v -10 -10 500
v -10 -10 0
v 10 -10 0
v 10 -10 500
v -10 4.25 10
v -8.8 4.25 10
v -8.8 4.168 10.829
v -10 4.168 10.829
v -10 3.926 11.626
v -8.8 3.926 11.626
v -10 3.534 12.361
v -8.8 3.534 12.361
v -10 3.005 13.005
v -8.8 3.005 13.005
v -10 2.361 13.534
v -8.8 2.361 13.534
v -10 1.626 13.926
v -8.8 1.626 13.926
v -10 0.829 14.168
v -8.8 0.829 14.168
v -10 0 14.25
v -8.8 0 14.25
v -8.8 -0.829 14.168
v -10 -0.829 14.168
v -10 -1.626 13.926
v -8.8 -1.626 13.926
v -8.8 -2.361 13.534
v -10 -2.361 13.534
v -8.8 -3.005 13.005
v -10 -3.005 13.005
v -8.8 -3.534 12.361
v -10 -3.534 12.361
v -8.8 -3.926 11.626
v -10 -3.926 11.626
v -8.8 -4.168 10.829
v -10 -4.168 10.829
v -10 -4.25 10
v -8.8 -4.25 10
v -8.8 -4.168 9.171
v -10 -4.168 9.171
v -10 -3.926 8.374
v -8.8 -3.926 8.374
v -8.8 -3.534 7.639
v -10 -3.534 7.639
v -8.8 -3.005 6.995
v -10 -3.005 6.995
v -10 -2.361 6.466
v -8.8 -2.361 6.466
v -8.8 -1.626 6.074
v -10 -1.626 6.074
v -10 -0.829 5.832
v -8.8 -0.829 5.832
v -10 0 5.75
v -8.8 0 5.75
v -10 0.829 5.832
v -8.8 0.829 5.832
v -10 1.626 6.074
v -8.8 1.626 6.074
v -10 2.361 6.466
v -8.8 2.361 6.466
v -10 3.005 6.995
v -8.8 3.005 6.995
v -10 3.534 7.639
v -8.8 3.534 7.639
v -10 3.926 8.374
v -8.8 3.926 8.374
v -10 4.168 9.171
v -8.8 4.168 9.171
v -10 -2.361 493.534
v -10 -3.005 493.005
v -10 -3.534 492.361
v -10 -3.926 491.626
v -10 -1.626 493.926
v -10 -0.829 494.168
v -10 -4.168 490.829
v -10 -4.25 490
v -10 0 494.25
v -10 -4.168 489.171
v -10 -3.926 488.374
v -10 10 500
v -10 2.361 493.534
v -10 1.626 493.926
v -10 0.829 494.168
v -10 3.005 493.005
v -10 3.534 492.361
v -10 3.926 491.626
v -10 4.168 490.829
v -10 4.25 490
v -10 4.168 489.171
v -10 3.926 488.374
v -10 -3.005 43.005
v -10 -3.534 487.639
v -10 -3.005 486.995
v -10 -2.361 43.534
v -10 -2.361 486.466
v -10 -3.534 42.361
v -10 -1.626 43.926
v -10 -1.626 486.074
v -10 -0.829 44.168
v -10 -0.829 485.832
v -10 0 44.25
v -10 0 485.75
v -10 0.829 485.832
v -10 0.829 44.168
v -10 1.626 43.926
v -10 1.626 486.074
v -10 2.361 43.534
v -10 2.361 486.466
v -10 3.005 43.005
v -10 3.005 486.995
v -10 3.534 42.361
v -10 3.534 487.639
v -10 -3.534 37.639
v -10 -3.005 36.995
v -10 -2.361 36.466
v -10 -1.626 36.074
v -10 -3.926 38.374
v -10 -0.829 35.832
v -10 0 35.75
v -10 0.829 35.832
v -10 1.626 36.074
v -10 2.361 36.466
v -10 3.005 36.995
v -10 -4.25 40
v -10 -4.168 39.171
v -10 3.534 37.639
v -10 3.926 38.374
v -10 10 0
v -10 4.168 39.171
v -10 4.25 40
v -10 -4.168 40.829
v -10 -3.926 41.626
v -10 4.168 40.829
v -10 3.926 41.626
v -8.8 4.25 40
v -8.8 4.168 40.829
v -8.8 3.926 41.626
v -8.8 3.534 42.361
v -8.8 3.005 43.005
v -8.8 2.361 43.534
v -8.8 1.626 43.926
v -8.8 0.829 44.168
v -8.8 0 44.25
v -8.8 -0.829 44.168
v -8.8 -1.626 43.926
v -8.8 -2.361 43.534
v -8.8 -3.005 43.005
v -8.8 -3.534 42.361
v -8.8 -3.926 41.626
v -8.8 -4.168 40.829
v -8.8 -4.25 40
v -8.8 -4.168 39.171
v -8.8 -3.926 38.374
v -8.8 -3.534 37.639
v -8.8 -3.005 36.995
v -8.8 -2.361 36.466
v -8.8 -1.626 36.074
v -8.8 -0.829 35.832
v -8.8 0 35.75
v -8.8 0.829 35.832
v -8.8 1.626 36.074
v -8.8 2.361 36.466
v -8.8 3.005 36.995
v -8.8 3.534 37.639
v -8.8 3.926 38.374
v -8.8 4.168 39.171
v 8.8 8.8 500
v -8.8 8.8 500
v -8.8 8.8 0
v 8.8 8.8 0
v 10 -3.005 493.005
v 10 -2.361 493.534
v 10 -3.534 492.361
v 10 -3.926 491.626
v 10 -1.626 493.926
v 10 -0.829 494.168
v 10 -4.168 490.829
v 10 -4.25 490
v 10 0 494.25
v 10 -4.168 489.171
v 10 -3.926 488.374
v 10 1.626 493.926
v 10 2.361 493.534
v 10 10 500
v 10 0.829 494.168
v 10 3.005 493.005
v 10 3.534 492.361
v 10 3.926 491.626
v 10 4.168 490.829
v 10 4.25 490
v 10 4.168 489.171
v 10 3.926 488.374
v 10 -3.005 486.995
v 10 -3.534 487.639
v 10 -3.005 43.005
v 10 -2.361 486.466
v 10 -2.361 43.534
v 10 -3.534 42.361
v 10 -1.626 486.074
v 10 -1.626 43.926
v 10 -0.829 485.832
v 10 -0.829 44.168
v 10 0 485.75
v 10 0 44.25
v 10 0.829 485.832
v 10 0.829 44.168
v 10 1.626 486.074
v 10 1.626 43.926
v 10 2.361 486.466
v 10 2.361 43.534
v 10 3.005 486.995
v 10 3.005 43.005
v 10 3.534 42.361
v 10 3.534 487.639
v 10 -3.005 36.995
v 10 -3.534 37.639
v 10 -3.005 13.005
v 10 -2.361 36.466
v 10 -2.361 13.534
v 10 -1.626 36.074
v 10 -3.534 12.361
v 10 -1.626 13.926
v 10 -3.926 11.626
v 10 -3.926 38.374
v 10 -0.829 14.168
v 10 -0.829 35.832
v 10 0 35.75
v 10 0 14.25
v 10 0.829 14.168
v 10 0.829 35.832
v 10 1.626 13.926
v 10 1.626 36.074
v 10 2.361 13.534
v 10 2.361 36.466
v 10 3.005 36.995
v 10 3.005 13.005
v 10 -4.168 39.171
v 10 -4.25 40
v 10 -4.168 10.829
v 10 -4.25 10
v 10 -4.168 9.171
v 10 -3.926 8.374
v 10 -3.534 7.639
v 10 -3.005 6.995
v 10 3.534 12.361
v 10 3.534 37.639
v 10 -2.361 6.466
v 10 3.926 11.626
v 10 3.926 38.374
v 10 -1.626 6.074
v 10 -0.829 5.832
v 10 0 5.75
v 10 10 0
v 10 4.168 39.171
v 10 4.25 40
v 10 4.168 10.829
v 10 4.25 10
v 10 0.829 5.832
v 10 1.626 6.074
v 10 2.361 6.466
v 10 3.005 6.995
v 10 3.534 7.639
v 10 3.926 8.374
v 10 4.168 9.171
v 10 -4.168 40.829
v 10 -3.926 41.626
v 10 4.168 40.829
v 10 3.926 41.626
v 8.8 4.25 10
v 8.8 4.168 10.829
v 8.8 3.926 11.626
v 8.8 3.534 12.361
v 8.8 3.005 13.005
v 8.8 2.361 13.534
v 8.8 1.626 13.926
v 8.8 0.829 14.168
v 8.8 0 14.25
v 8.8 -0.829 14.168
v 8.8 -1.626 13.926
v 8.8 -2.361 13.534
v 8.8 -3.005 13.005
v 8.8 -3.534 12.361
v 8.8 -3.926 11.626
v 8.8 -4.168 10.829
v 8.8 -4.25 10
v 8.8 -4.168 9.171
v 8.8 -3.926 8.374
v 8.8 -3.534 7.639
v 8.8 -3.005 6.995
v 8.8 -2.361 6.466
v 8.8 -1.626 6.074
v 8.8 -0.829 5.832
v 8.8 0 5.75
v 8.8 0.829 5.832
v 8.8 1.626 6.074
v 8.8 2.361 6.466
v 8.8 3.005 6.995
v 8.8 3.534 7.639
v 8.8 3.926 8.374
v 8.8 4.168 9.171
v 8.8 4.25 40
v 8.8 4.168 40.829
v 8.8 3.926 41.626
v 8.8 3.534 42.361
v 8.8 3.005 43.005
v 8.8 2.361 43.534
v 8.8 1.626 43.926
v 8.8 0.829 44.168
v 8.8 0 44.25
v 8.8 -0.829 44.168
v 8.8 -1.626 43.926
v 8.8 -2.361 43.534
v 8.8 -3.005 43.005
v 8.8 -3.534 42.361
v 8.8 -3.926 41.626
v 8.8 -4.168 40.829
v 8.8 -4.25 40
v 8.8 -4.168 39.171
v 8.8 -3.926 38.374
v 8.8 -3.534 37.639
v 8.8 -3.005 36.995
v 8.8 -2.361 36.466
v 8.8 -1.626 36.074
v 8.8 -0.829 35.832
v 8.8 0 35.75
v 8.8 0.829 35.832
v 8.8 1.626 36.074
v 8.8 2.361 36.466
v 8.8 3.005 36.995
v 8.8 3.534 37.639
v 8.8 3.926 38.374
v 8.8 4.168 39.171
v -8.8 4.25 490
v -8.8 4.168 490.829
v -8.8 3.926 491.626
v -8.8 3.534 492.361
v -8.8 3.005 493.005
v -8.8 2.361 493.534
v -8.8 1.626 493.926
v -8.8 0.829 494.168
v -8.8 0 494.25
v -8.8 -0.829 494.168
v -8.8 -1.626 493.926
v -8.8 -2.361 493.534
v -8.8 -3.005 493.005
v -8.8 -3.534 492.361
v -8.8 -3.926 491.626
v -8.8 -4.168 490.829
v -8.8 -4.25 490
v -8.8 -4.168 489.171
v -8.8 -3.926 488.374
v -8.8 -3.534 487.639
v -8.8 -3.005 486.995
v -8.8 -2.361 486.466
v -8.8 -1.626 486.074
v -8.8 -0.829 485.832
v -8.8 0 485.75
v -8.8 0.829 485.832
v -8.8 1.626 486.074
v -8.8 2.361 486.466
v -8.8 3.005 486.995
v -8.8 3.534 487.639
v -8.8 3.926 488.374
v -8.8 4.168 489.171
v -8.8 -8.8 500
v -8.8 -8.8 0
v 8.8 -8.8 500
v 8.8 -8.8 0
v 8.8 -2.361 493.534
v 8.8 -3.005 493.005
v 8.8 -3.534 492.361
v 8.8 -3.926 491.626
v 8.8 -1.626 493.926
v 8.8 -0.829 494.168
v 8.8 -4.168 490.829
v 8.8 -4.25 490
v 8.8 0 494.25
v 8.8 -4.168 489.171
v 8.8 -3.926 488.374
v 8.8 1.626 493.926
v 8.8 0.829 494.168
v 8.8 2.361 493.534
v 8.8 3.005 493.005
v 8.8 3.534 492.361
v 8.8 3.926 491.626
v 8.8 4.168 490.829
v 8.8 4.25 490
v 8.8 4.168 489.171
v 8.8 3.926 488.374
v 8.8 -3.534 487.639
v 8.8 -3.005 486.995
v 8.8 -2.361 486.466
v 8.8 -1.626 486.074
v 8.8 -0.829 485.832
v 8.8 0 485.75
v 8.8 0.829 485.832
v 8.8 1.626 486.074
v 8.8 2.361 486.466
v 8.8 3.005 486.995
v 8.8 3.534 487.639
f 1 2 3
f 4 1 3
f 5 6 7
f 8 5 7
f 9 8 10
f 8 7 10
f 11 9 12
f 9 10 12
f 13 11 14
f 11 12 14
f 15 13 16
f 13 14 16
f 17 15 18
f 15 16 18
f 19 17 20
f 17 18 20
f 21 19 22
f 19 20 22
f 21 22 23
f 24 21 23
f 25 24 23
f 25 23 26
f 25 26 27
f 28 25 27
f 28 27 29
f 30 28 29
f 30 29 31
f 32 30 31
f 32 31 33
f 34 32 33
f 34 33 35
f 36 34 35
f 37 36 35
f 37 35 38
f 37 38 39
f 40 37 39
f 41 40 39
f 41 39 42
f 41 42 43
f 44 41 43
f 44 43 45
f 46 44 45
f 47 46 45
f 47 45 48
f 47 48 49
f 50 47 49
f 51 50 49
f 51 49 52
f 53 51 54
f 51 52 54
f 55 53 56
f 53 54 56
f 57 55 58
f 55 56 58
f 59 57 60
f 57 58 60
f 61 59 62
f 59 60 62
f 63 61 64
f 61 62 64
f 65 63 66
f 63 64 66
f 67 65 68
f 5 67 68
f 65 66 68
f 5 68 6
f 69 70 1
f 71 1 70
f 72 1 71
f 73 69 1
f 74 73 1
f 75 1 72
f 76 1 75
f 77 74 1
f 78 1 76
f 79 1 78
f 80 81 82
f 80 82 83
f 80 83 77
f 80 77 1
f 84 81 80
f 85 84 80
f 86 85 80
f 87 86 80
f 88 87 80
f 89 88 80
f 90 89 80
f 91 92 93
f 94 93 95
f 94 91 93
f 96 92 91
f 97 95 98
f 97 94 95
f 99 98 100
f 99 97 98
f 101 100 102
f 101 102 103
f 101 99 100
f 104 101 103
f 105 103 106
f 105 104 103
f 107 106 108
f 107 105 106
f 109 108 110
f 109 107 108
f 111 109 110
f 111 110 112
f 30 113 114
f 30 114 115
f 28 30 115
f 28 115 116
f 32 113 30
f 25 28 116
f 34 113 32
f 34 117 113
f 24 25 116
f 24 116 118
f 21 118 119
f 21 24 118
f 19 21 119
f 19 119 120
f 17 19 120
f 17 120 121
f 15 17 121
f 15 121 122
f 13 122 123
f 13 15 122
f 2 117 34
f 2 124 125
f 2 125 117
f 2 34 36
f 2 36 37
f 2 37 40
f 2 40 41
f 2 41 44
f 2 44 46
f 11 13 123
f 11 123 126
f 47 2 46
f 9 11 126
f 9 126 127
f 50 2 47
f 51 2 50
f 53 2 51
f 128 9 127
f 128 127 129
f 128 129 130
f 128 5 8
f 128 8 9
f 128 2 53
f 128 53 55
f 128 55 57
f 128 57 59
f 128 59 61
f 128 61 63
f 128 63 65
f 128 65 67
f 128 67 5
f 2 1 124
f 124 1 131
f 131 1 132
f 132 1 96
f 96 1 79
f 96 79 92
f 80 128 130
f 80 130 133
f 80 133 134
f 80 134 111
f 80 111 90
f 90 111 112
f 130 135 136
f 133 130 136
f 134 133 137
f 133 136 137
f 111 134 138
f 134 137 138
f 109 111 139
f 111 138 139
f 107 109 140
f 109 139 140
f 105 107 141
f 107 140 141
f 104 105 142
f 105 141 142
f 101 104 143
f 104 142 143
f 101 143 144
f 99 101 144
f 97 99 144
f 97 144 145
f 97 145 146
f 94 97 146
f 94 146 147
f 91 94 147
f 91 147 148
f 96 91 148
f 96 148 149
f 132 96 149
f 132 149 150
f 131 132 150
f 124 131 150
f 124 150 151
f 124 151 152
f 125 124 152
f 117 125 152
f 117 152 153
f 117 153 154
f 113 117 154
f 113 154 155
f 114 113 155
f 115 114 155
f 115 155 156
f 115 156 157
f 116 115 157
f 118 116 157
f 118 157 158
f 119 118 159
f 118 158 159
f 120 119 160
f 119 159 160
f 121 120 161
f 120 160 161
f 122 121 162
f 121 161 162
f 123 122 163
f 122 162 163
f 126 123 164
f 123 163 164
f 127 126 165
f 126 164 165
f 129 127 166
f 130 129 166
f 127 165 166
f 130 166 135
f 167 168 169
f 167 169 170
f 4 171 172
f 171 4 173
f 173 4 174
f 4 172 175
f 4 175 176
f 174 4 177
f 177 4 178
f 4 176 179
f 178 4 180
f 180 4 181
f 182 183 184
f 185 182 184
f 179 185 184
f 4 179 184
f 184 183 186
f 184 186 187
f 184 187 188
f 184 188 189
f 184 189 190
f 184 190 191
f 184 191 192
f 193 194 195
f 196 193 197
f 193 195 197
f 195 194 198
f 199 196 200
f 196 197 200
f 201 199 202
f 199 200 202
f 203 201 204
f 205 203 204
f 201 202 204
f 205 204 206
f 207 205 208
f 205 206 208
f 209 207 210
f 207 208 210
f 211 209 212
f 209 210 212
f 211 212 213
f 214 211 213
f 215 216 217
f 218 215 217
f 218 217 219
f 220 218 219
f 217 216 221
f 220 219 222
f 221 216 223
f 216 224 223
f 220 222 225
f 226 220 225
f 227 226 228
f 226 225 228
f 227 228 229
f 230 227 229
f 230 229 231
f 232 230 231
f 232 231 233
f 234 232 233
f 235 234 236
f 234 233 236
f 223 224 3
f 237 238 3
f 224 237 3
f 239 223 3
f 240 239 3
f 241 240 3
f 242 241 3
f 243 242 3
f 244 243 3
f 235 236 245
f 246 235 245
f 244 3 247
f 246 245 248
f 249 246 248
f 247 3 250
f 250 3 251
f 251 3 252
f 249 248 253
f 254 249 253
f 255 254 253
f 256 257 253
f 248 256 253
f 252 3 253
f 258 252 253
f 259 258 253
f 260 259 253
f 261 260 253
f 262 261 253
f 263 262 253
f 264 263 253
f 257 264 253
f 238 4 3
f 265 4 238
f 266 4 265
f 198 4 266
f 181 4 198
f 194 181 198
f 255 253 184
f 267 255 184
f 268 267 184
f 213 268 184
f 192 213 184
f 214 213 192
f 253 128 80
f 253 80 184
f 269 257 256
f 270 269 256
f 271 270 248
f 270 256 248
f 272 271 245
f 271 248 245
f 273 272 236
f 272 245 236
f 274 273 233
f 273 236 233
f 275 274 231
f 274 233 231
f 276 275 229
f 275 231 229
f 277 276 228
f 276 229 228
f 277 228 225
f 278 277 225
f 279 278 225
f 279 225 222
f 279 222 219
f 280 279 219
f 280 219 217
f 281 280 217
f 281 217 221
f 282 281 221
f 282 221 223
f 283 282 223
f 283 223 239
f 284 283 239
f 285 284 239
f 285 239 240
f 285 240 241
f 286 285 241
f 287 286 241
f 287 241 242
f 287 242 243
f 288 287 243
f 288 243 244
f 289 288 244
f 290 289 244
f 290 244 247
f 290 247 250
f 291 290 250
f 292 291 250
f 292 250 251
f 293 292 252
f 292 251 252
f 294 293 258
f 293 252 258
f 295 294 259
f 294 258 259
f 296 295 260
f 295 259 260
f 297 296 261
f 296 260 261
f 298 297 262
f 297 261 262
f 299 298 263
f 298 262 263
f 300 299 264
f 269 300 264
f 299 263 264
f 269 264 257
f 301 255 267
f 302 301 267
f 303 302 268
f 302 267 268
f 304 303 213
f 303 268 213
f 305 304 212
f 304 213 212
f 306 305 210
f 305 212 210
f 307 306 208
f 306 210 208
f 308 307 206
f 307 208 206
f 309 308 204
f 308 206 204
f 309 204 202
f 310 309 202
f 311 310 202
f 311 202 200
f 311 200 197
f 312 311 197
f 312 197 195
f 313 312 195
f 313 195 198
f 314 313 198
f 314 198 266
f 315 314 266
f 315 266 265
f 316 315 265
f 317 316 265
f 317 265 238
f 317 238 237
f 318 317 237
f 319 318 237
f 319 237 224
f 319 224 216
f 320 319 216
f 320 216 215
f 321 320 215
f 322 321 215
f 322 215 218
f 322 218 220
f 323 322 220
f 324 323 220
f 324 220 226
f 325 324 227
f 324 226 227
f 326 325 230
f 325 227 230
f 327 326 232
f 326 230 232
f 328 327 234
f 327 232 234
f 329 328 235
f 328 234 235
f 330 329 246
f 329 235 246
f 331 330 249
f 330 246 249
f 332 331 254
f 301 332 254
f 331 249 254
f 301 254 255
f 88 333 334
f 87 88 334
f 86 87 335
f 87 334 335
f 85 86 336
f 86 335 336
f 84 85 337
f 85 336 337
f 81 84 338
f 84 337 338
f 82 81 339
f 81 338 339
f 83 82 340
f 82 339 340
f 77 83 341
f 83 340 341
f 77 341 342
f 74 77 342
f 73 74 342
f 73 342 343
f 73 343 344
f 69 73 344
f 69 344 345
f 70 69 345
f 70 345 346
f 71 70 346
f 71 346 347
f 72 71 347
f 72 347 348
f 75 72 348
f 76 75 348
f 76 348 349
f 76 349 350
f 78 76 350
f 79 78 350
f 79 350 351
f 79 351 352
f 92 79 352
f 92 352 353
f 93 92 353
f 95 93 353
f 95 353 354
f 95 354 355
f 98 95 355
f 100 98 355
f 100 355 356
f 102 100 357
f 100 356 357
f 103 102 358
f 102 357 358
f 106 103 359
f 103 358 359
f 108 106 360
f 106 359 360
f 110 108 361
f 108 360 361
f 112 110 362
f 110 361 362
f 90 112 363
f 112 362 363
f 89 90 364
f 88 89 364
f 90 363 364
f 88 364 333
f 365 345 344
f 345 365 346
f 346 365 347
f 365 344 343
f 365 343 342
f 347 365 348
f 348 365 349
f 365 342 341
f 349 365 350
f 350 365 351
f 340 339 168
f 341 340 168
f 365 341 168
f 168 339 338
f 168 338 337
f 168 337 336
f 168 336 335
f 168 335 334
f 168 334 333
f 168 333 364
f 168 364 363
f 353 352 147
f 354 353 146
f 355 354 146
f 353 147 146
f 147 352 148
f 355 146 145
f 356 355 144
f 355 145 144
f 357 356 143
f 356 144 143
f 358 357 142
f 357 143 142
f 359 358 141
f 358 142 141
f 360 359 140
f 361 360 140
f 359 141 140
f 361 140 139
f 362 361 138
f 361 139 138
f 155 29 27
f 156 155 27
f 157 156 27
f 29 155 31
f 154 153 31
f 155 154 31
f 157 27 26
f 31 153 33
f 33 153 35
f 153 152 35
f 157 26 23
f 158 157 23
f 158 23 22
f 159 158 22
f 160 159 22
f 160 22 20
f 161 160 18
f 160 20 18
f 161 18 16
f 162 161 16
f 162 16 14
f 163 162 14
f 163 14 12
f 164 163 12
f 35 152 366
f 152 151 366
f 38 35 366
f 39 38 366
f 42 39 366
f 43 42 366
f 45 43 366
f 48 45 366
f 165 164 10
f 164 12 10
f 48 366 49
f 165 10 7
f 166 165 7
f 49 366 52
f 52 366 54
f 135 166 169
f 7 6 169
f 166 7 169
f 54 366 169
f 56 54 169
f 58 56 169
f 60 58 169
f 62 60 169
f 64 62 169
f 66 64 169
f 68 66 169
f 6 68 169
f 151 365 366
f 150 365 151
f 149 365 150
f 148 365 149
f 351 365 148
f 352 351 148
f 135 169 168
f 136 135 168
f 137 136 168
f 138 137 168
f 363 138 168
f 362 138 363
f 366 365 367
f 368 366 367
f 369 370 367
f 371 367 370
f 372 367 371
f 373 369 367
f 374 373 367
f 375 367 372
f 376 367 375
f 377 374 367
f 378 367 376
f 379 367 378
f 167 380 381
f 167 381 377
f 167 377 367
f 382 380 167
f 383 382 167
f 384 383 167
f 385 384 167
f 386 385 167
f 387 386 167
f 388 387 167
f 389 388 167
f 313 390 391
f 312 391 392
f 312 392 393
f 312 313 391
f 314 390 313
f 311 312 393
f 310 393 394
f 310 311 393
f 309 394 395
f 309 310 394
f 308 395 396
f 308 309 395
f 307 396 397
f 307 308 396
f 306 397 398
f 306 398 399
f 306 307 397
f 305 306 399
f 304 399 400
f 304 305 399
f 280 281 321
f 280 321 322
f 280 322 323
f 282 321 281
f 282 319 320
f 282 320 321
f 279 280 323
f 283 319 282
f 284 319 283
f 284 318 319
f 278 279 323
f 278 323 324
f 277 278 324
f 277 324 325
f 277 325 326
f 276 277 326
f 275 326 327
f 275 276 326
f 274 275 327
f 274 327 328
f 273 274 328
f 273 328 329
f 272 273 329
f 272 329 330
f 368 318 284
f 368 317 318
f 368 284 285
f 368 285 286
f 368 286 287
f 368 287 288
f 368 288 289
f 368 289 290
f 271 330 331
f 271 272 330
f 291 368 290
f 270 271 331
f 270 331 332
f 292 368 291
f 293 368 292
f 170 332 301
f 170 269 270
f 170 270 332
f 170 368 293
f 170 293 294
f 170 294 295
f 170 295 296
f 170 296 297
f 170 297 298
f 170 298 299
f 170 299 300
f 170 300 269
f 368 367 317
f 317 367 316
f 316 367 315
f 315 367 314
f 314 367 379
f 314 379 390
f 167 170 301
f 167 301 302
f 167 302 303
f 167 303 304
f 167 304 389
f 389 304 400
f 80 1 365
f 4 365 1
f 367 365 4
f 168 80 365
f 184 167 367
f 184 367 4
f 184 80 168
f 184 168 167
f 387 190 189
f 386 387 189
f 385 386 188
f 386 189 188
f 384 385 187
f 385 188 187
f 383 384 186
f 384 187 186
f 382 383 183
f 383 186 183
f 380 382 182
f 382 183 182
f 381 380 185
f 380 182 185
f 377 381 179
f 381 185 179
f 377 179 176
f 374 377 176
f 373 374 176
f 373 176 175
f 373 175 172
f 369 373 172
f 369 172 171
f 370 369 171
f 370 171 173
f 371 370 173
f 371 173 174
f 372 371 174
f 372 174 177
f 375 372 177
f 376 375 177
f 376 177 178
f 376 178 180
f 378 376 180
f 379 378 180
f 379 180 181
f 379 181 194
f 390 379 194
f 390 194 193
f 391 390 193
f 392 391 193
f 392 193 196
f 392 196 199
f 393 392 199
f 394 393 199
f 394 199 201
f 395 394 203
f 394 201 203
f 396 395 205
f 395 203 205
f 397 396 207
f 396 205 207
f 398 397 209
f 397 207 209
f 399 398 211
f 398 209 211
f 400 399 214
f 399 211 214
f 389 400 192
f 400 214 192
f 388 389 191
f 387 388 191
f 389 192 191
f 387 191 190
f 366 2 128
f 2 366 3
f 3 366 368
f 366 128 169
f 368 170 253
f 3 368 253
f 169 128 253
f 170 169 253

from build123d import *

# Parameters (mm, degrees)
SKETCH1_W           = 20
SKETCH1_H           = 20
SKETCH1_W_2         = 17.6
SKETCH1_H_2         = 17.6
BOSS_EXTRUDE1_DEPTH = 500
SKETCH2_R           = 4.25
CUT_EXTRUDE1_DEPTH  = 600


with BuildPart() as part:
    # Sketch1 → Boss-Extrude1 (new body)
    with BuildSketch(Plane.XY):
        Rectangle(SKETCH1_W, SKETCH1_H)
        Rectangle(SKETCH1_W_2, SKETCH1_H_2, mode=Mode.SUBTRACT)
    extrude(amount=BOSS_EXTRUDE1_DEPTH)

    # Sketch2 → Cut-Extrude1 (cut)
    with BuildSketch(Plane(origin=(10, 0, 0), x_dir=(0, 0, -1), z_dir=(1, 0, 0))):
        with Locations(Location((-490, 0, 0), (0, 0, 90))):
            Circle(SKETCH2_R)
        with Locations(Location((-10, 0, 0), (0, 0, 90))):
            Circle(SKETCH2_R)
        with Locations(Location((-40, 0, 0), (0, 0, 90))):
            Circle(SKETCH2_R)
    extrude(amount=-CUT_EXTRUDE1_DEPTH, mode=Mode.SUBTRACT)


solid = part.part
